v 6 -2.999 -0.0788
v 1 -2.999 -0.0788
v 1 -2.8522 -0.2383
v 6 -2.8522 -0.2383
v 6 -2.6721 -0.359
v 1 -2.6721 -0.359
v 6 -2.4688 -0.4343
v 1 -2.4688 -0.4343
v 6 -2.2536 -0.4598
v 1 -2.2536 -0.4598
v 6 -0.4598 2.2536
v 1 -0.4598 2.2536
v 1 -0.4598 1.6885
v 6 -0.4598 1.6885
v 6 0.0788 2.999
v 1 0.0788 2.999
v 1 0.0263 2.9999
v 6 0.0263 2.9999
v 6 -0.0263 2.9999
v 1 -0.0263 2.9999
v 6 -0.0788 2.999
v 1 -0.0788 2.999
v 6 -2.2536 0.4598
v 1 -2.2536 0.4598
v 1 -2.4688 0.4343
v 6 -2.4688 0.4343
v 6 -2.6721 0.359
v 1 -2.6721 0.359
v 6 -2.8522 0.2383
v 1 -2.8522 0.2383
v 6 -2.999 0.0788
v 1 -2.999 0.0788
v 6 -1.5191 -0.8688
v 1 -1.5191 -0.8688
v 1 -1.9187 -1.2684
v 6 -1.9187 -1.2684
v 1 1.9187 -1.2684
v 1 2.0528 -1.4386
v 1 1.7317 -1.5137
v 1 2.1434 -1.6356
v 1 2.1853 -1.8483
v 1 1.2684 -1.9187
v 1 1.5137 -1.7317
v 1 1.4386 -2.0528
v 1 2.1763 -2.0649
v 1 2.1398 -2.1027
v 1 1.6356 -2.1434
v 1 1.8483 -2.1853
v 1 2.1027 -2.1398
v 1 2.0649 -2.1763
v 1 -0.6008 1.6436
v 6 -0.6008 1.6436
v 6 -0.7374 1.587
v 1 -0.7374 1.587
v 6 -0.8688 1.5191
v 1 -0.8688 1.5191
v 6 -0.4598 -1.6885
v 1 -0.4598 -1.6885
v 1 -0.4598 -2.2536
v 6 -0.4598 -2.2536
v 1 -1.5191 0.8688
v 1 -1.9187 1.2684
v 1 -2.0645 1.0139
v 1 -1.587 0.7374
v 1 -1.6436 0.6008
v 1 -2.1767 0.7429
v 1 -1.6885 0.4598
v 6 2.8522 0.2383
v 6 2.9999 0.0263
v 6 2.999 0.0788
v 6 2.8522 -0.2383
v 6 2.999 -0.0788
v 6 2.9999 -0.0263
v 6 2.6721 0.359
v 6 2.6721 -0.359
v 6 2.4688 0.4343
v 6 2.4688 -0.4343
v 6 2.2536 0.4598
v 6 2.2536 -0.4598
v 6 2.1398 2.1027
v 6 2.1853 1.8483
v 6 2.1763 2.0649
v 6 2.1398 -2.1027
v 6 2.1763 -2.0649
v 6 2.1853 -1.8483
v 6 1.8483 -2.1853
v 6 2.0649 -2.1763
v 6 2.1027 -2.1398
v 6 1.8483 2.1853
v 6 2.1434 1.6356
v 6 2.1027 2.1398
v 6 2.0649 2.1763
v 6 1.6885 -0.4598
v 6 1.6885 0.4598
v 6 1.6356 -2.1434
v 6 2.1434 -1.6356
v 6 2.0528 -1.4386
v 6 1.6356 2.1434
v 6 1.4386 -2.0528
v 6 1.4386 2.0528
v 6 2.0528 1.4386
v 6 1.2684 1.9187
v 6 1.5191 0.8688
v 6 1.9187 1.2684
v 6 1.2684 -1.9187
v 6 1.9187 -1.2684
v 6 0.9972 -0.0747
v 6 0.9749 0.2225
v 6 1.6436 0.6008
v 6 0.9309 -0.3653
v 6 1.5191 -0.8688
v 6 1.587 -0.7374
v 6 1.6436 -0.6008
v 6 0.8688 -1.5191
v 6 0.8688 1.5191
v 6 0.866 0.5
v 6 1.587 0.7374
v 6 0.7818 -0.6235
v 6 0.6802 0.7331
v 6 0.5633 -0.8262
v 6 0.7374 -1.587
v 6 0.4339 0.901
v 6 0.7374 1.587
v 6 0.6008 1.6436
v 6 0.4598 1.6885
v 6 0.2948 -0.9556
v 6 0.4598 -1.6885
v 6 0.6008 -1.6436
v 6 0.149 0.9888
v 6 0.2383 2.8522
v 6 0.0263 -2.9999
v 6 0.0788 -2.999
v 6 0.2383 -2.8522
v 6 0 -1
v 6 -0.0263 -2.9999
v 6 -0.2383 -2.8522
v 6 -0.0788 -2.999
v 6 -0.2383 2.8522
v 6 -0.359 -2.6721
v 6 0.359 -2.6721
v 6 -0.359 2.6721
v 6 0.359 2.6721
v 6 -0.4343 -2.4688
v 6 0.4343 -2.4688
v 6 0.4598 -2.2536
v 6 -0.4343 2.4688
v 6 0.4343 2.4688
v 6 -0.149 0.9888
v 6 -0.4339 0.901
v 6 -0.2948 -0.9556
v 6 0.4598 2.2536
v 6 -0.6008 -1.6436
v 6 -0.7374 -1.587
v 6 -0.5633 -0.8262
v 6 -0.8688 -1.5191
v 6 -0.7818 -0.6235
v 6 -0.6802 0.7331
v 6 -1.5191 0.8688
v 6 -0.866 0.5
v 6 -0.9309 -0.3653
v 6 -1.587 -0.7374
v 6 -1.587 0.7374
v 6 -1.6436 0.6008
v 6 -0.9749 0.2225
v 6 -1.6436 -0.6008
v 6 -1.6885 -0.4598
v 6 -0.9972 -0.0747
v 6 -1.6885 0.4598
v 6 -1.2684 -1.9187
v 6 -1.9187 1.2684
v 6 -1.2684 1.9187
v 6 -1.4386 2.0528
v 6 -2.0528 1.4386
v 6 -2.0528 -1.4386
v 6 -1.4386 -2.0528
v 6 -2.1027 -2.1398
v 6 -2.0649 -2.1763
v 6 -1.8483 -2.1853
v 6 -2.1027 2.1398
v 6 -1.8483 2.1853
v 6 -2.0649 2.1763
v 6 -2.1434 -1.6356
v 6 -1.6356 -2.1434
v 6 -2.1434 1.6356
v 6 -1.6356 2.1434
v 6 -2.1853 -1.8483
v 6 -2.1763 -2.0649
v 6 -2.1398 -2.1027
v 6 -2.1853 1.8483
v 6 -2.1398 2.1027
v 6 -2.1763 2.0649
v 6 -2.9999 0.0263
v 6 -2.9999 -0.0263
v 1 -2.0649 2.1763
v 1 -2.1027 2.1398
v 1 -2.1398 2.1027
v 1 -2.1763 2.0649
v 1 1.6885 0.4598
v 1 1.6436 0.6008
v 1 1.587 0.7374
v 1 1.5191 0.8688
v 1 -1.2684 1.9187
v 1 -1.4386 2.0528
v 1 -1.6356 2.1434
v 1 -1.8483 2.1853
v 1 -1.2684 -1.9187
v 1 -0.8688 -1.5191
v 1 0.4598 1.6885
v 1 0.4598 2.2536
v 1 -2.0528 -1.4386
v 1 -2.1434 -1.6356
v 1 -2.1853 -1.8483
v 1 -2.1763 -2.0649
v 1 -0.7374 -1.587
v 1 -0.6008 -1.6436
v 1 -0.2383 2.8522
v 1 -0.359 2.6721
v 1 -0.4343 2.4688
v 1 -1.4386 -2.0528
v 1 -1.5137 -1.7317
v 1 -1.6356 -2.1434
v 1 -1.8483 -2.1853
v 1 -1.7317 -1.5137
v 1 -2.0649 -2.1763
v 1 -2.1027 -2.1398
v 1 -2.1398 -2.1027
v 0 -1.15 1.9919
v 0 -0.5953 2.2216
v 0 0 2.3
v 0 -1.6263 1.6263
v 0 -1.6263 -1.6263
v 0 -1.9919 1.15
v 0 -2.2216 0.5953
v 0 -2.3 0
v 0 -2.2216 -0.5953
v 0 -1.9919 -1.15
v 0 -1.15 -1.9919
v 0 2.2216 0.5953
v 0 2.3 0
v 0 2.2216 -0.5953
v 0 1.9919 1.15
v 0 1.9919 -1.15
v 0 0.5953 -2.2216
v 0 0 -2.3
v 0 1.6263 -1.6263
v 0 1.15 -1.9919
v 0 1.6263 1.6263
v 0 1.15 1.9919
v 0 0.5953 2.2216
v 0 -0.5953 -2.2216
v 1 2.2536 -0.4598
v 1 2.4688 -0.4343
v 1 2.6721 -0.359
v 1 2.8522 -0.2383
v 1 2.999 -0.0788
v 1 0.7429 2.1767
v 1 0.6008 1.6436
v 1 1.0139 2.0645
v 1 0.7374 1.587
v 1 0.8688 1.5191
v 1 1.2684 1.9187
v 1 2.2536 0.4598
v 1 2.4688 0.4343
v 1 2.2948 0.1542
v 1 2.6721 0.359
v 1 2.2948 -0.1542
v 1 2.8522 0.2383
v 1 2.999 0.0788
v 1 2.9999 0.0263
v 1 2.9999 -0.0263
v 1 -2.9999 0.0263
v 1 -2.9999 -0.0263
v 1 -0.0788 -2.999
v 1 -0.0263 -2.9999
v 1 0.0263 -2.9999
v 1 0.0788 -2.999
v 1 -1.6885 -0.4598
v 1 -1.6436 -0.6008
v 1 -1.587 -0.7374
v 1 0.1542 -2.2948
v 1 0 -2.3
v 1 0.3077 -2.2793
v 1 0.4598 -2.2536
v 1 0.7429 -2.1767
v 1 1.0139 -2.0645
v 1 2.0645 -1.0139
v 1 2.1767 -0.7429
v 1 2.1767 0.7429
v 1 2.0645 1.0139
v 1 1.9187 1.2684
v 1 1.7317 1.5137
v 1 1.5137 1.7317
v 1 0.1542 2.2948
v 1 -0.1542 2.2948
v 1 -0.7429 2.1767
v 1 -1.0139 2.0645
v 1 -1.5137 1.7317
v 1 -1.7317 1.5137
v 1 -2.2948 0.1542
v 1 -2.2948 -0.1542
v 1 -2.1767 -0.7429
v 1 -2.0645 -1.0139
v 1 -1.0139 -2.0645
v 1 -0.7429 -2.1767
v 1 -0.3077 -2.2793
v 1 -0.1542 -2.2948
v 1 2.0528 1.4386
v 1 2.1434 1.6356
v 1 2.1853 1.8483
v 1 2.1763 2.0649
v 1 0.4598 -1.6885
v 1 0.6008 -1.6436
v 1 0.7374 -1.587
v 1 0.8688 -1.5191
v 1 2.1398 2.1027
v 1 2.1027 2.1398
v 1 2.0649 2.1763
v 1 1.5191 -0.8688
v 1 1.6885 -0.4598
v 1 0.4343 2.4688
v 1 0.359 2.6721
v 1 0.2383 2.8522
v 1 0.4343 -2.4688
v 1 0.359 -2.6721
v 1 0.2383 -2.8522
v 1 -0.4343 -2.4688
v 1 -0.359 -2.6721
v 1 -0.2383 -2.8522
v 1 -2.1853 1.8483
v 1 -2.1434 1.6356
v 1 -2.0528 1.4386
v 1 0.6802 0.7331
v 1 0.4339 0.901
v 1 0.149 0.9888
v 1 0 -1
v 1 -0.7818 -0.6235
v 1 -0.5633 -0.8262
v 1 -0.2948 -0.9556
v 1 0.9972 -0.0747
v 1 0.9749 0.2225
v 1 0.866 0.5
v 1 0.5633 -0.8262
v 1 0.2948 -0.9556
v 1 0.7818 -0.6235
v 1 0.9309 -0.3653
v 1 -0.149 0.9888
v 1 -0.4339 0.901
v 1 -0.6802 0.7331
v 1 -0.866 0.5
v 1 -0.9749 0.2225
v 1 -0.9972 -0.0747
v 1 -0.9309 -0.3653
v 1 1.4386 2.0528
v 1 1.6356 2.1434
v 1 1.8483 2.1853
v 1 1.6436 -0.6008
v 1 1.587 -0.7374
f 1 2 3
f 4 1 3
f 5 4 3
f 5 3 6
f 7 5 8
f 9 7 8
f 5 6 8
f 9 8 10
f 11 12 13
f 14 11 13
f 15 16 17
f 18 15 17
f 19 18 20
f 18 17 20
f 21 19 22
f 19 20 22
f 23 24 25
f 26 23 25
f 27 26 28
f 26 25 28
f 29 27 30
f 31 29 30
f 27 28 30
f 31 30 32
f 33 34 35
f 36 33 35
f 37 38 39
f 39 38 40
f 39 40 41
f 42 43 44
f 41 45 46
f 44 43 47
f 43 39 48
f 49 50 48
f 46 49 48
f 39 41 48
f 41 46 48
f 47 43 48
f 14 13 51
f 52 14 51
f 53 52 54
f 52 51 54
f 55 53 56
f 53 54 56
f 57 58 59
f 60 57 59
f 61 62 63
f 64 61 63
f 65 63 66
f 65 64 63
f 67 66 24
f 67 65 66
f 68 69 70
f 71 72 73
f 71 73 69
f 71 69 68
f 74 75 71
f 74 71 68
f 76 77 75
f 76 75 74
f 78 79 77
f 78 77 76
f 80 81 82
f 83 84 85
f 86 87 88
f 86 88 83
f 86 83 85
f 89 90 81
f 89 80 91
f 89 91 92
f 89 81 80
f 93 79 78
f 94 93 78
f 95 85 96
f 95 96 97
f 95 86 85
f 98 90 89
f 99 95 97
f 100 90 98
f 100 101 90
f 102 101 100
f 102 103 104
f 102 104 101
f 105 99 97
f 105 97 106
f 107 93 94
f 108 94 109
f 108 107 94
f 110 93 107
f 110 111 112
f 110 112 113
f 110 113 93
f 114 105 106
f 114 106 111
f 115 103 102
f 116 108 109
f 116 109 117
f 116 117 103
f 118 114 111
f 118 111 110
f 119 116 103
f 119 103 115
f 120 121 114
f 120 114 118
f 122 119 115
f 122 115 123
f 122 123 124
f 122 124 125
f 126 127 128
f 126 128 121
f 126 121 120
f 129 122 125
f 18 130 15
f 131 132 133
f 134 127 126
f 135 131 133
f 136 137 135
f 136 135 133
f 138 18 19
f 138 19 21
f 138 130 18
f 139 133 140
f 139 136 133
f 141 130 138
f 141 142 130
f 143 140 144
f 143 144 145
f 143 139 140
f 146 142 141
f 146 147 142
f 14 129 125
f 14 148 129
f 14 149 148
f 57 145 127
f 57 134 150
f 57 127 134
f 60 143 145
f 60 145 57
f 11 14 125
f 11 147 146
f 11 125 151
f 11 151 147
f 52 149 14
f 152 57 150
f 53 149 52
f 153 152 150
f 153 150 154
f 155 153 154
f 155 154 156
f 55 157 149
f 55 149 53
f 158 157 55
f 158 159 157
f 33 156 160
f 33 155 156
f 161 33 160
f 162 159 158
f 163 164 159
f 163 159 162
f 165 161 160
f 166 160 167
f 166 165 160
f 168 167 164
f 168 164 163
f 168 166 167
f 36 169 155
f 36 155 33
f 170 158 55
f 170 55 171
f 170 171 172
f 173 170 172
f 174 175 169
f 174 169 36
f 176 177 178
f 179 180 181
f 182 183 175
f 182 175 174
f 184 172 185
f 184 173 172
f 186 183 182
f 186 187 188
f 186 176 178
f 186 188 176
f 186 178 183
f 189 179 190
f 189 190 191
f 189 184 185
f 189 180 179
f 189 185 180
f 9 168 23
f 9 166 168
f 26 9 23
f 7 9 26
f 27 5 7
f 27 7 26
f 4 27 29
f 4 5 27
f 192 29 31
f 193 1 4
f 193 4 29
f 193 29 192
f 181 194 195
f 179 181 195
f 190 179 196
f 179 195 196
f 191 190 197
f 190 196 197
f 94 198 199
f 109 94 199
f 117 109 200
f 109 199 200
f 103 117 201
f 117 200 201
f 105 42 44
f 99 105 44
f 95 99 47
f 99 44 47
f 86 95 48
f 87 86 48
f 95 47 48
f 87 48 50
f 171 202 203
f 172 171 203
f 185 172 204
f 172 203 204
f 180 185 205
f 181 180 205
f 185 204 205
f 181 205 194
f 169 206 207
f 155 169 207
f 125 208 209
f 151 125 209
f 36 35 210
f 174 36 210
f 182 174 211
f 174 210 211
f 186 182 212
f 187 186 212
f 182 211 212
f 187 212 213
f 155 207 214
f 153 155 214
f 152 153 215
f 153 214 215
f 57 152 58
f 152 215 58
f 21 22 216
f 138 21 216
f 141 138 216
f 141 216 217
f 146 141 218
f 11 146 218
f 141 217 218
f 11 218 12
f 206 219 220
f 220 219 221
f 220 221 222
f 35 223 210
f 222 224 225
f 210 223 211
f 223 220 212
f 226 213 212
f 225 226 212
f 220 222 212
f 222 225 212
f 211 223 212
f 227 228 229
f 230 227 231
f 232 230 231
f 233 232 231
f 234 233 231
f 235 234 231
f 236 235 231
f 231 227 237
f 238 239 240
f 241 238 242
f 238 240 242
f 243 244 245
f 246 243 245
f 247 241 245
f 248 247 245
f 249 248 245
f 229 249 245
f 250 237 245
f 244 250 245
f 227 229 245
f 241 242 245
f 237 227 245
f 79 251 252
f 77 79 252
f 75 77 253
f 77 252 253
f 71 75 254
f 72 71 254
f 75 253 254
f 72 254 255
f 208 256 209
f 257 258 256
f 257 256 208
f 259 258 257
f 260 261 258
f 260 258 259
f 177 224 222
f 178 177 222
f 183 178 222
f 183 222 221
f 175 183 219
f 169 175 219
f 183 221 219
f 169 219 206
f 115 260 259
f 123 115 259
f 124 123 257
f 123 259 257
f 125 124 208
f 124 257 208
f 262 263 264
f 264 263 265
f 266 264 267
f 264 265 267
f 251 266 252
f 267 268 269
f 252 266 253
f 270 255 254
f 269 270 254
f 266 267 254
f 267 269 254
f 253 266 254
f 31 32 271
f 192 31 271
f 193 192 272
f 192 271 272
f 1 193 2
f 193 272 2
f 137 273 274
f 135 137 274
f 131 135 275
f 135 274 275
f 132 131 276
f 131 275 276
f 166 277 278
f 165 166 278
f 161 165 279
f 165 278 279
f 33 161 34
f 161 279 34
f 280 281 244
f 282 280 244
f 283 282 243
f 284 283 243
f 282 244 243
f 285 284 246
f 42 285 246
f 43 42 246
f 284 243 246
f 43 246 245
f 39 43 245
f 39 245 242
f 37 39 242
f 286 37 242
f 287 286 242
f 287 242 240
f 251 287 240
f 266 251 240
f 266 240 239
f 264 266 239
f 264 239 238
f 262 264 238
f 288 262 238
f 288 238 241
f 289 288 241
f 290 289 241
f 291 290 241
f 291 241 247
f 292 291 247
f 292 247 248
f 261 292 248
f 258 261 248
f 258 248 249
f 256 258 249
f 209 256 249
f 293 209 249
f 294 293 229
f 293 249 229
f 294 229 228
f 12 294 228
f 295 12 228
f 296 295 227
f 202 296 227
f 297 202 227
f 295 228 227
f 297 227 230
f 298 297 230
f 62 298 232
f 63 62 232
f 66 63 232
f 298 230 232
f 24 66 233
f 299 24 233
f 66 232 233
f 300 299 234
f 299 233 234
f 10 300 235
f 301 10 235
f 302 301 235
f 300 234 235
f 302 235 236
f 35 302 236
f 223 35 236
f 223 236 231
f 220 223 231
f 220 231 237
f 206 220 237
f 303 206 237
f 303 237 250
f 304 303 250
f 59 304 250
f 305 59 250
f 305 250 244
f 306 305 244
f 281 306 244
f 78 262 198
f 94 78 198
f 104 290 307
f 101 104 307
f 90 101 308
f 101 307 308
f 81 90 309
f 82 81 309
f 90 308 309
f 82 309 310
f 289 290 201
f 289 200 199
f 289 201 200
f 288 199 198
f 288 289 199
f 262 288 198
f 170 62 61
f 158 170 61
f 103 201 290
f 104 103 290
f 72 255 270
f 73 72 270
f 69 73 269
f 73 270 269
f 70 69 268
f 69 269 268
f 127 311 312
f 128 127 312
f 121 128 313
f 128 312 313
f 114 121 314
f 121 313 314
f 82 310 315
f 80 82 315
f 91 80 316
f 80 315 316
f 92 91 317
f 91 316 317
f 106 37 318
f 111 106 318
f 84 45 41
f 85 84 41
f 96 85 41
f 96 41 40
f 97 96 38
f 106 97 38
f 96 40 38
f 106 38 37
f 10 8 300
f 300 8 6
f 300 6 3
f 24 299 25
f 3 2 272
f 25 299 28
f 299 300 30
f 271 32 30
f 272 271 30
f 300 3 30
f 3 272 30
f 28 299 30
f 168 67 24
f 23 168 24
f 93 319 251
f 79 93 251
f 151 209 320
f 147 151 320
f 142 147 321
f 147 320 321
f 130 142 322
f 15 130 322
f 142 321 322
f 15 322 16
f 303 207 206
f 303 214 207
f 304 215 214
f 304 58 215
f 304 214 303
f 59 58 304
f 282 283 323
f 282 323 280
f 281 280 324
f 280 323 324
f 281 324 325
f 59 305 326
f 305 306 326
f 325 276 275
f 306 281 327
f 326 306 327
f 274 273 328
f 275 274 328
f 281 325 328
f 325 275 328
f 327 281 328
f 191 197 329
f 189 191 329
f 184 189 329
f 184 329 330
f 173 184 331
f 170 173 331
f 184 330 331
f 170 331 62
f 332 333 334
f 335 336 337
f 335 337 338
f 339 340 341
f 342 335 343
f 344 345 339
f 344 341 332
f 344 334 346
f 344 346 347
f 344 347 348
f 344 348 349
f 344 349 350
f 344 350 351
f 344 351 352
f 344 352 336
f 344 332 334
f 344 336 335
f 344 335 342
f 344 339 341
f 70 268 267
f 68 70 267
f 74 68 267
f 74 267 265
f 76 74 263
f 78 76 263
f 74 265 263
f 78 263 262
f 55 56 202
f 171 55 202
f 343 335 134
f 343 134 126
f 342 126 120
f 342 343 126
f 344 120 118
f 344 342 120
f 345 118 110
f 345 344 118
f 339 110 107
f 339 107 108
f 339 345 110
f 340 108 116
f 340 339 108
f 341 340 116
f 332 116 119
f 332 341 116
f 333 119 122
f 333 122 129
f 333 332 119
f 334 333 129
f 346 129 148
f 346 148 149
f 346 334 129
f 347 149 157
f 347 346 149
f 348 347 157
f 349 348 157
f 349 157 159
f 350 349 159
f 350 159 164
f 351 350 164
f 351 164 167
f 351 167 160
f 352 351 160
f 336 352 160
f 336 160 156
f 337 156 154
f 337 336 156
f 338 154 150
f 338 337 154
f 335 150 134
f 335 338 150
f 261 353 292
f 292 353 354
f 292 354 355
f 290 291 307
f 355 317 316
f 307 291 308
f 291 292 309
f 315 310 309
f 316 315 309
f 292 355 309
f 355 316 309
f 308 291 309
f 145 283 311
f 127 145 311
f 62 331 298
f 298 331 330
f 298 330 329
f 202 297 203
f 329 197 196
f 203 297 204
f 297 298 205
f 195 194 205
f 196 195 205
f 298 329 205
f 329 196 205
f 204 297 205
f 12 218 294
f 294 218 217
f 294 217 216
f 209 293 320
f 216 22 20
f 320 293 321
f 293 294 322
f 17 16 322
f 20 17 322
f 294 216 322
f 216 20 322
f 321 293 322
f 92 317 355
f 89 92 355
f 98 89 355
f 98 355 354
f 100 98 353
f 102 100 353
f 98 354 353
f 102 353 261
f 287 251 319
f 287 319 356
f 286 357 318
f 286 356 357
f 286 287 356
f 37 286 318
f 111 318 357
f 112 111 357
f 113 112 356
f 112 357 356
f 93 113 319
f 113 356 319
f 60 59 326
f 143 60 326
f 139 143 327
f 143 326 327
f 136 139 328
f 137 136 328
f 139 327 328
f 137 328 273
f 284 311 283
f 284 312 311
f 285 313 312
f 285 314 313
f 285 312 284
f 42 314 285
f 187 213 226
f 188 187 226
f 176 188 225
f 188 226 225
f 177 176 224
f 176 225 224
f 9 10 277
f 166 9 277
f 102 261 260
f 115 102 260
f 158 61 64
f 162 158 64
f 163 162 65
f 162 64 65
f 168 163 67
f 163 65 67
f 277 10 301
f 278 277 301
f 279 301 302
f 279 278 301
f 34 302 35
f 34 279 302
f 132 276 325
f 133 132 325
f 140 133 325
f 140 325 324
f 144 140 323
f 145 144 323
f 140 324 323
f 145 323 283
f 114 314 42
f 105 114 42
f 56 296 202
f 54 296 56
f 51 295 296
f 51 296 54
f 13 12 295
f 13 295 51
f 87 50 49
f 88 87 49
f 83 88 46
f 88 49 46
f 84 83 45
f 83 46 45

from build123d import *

# Parameters (mm, degrees)
SKETCH1_R           = 2.3
BOSS_EXTRUDE1_DEPTH = 1
SKETCH2_R           = 1.75
SKETCH2_R_2         = 1
BOSS_EXTRUDE2_DEPTH = 5
BOSS_EXTRUDE3_DEPTH = 5
CIRPATTERN1_COUNT   = 8


with BuildPart() as part:
    # Sketch1 → Boss-Extrude1 (new body)
    with BuildSketch(Plane(origin=(0, 0, 0), x_dir=(0, 0, -1), z_dir=(1, 0, 0))):
        Circle(SKETCH1_R)
    extrude(amount=BOSS_EXTRUDE1_DEPTH)

    # Sketch2 → Boss-Extrude2 (add)
    with BuildSketch(Plane(origin=(1, 0, 0), x_dir=(0, 0, -1), z_dir=(1, 0, 0))):
        Circle(SKETCH2_R)
        Circle(SKETCH2_R_2, mode=Mode.SUBTRACT)
    extrude(amount=BOSS_EXTRUDE2_DEPTH)


with BuildPart() as body_2:
    # Sketch3 → Boss-Extrude3 (new body)
    with BuildSketch(Plane(origin=(1, 0, 0), x_dir=(0, 0, -1), z_dir=(1, 0, 0))):
        with BuildLine():
            ThreePointArc((-0.45982072, 1.68850967), (0, 1.75), (0.45982072, 1.68850967))
            Line((0.45982072, 1.68850967), (0.45982072, 2.253567151))
            ThreePointArc((0.45982072, 2.253567151), (0.359046611, 2.672132166), (0.078809895, 2.998964655))
            ThreePointArc((0.078809895, 2.998964655), (0, 3), (-0.078809895, 2.998964655))
            ThreePointArc((-0.078809895, 2.998964655), (-0.359046611, 2.672132166), (-0.45982072, 2.253567151))
            Line((-0.45982072, 2.253567151), (-0.45982072, 1.68850967))
        make_face()
    extrude(amount=BOSS_EXTRUDE3_DEPTH)


with BuildPart() as cirpattern1_1:
    # CirPattern1: pattern copy
    add(body_2.part.rotate(Axis((0, 0, 0), (1, 0, 0)), 1 * 360 / CIRPATTERN1_COUNT))


with BuildPart() as cirpattern1_2:
    # CirPattern1: pattern copy
    add(body_2.part.rotate(Axis((0, 0, 0), (1, 0, 0)), 2 * 360 / CIRPATTERN1_COUNT))


with BuildPart() as cirpattern1_3:
    # CirPattern1: pattern copy
    add(body_2.part.rotate(Axis((0, 0, 0), (1, 0, 0)), 3 * 360 / CIRPATTERN1_COUNT))


with BuildPart() as cirpattern1_4:
    # CirPattern1: pattern copy
    add(body_2.part.rotate(Axis((0, 0, 0), (1, 0, 0)), 4 * 360 / CIRPATTERN1_COUNT))


with BuildPart() as cirpattern1_5:
    # CirPattern1: pattern copy
    add(body_2.part.rotate(Axis((0, 0, 0), (1, 0, 0)), 5 * 360 / CIRPATTERN1_COUNT))


with BuildPart() as cirpattern1_6:
    # CirPattern1: pattern copy
    add(body_2.part.rotate(Axis((0, 0, 0), (1, 0, 0)), 6 * 360 / CIRPATTERN1_COUNT))


with BuildPart() as cirpattern1_7:
    # CirPattern1: pattern copy
    add(body_2.part.rotate(Axis((0, 0, 0), (1, 0, 0)), 7 * 360 / CIRPATTERN1_COUNT))


with BuildPart() as body_2_1:
    add(body_2.part)

    # Combine1: union CirPattern1_7, CirPattern1_6, CirPattern1_4, CirPattern1_3, part, CirPattern1_1, CirPattern1_2, CirPattern1_5
    add(cirpattern1_7.part)
    add(cirpattern1_6.part)
    add(cirpattern1_4.part)
    add(cirpattern1_3.part)
    add(part.part)
    add(cirpattern1_1.part)
    add(cirpattern1_2.part)
    add(cirpattern1_5.part)


solid = body_2_1.part
